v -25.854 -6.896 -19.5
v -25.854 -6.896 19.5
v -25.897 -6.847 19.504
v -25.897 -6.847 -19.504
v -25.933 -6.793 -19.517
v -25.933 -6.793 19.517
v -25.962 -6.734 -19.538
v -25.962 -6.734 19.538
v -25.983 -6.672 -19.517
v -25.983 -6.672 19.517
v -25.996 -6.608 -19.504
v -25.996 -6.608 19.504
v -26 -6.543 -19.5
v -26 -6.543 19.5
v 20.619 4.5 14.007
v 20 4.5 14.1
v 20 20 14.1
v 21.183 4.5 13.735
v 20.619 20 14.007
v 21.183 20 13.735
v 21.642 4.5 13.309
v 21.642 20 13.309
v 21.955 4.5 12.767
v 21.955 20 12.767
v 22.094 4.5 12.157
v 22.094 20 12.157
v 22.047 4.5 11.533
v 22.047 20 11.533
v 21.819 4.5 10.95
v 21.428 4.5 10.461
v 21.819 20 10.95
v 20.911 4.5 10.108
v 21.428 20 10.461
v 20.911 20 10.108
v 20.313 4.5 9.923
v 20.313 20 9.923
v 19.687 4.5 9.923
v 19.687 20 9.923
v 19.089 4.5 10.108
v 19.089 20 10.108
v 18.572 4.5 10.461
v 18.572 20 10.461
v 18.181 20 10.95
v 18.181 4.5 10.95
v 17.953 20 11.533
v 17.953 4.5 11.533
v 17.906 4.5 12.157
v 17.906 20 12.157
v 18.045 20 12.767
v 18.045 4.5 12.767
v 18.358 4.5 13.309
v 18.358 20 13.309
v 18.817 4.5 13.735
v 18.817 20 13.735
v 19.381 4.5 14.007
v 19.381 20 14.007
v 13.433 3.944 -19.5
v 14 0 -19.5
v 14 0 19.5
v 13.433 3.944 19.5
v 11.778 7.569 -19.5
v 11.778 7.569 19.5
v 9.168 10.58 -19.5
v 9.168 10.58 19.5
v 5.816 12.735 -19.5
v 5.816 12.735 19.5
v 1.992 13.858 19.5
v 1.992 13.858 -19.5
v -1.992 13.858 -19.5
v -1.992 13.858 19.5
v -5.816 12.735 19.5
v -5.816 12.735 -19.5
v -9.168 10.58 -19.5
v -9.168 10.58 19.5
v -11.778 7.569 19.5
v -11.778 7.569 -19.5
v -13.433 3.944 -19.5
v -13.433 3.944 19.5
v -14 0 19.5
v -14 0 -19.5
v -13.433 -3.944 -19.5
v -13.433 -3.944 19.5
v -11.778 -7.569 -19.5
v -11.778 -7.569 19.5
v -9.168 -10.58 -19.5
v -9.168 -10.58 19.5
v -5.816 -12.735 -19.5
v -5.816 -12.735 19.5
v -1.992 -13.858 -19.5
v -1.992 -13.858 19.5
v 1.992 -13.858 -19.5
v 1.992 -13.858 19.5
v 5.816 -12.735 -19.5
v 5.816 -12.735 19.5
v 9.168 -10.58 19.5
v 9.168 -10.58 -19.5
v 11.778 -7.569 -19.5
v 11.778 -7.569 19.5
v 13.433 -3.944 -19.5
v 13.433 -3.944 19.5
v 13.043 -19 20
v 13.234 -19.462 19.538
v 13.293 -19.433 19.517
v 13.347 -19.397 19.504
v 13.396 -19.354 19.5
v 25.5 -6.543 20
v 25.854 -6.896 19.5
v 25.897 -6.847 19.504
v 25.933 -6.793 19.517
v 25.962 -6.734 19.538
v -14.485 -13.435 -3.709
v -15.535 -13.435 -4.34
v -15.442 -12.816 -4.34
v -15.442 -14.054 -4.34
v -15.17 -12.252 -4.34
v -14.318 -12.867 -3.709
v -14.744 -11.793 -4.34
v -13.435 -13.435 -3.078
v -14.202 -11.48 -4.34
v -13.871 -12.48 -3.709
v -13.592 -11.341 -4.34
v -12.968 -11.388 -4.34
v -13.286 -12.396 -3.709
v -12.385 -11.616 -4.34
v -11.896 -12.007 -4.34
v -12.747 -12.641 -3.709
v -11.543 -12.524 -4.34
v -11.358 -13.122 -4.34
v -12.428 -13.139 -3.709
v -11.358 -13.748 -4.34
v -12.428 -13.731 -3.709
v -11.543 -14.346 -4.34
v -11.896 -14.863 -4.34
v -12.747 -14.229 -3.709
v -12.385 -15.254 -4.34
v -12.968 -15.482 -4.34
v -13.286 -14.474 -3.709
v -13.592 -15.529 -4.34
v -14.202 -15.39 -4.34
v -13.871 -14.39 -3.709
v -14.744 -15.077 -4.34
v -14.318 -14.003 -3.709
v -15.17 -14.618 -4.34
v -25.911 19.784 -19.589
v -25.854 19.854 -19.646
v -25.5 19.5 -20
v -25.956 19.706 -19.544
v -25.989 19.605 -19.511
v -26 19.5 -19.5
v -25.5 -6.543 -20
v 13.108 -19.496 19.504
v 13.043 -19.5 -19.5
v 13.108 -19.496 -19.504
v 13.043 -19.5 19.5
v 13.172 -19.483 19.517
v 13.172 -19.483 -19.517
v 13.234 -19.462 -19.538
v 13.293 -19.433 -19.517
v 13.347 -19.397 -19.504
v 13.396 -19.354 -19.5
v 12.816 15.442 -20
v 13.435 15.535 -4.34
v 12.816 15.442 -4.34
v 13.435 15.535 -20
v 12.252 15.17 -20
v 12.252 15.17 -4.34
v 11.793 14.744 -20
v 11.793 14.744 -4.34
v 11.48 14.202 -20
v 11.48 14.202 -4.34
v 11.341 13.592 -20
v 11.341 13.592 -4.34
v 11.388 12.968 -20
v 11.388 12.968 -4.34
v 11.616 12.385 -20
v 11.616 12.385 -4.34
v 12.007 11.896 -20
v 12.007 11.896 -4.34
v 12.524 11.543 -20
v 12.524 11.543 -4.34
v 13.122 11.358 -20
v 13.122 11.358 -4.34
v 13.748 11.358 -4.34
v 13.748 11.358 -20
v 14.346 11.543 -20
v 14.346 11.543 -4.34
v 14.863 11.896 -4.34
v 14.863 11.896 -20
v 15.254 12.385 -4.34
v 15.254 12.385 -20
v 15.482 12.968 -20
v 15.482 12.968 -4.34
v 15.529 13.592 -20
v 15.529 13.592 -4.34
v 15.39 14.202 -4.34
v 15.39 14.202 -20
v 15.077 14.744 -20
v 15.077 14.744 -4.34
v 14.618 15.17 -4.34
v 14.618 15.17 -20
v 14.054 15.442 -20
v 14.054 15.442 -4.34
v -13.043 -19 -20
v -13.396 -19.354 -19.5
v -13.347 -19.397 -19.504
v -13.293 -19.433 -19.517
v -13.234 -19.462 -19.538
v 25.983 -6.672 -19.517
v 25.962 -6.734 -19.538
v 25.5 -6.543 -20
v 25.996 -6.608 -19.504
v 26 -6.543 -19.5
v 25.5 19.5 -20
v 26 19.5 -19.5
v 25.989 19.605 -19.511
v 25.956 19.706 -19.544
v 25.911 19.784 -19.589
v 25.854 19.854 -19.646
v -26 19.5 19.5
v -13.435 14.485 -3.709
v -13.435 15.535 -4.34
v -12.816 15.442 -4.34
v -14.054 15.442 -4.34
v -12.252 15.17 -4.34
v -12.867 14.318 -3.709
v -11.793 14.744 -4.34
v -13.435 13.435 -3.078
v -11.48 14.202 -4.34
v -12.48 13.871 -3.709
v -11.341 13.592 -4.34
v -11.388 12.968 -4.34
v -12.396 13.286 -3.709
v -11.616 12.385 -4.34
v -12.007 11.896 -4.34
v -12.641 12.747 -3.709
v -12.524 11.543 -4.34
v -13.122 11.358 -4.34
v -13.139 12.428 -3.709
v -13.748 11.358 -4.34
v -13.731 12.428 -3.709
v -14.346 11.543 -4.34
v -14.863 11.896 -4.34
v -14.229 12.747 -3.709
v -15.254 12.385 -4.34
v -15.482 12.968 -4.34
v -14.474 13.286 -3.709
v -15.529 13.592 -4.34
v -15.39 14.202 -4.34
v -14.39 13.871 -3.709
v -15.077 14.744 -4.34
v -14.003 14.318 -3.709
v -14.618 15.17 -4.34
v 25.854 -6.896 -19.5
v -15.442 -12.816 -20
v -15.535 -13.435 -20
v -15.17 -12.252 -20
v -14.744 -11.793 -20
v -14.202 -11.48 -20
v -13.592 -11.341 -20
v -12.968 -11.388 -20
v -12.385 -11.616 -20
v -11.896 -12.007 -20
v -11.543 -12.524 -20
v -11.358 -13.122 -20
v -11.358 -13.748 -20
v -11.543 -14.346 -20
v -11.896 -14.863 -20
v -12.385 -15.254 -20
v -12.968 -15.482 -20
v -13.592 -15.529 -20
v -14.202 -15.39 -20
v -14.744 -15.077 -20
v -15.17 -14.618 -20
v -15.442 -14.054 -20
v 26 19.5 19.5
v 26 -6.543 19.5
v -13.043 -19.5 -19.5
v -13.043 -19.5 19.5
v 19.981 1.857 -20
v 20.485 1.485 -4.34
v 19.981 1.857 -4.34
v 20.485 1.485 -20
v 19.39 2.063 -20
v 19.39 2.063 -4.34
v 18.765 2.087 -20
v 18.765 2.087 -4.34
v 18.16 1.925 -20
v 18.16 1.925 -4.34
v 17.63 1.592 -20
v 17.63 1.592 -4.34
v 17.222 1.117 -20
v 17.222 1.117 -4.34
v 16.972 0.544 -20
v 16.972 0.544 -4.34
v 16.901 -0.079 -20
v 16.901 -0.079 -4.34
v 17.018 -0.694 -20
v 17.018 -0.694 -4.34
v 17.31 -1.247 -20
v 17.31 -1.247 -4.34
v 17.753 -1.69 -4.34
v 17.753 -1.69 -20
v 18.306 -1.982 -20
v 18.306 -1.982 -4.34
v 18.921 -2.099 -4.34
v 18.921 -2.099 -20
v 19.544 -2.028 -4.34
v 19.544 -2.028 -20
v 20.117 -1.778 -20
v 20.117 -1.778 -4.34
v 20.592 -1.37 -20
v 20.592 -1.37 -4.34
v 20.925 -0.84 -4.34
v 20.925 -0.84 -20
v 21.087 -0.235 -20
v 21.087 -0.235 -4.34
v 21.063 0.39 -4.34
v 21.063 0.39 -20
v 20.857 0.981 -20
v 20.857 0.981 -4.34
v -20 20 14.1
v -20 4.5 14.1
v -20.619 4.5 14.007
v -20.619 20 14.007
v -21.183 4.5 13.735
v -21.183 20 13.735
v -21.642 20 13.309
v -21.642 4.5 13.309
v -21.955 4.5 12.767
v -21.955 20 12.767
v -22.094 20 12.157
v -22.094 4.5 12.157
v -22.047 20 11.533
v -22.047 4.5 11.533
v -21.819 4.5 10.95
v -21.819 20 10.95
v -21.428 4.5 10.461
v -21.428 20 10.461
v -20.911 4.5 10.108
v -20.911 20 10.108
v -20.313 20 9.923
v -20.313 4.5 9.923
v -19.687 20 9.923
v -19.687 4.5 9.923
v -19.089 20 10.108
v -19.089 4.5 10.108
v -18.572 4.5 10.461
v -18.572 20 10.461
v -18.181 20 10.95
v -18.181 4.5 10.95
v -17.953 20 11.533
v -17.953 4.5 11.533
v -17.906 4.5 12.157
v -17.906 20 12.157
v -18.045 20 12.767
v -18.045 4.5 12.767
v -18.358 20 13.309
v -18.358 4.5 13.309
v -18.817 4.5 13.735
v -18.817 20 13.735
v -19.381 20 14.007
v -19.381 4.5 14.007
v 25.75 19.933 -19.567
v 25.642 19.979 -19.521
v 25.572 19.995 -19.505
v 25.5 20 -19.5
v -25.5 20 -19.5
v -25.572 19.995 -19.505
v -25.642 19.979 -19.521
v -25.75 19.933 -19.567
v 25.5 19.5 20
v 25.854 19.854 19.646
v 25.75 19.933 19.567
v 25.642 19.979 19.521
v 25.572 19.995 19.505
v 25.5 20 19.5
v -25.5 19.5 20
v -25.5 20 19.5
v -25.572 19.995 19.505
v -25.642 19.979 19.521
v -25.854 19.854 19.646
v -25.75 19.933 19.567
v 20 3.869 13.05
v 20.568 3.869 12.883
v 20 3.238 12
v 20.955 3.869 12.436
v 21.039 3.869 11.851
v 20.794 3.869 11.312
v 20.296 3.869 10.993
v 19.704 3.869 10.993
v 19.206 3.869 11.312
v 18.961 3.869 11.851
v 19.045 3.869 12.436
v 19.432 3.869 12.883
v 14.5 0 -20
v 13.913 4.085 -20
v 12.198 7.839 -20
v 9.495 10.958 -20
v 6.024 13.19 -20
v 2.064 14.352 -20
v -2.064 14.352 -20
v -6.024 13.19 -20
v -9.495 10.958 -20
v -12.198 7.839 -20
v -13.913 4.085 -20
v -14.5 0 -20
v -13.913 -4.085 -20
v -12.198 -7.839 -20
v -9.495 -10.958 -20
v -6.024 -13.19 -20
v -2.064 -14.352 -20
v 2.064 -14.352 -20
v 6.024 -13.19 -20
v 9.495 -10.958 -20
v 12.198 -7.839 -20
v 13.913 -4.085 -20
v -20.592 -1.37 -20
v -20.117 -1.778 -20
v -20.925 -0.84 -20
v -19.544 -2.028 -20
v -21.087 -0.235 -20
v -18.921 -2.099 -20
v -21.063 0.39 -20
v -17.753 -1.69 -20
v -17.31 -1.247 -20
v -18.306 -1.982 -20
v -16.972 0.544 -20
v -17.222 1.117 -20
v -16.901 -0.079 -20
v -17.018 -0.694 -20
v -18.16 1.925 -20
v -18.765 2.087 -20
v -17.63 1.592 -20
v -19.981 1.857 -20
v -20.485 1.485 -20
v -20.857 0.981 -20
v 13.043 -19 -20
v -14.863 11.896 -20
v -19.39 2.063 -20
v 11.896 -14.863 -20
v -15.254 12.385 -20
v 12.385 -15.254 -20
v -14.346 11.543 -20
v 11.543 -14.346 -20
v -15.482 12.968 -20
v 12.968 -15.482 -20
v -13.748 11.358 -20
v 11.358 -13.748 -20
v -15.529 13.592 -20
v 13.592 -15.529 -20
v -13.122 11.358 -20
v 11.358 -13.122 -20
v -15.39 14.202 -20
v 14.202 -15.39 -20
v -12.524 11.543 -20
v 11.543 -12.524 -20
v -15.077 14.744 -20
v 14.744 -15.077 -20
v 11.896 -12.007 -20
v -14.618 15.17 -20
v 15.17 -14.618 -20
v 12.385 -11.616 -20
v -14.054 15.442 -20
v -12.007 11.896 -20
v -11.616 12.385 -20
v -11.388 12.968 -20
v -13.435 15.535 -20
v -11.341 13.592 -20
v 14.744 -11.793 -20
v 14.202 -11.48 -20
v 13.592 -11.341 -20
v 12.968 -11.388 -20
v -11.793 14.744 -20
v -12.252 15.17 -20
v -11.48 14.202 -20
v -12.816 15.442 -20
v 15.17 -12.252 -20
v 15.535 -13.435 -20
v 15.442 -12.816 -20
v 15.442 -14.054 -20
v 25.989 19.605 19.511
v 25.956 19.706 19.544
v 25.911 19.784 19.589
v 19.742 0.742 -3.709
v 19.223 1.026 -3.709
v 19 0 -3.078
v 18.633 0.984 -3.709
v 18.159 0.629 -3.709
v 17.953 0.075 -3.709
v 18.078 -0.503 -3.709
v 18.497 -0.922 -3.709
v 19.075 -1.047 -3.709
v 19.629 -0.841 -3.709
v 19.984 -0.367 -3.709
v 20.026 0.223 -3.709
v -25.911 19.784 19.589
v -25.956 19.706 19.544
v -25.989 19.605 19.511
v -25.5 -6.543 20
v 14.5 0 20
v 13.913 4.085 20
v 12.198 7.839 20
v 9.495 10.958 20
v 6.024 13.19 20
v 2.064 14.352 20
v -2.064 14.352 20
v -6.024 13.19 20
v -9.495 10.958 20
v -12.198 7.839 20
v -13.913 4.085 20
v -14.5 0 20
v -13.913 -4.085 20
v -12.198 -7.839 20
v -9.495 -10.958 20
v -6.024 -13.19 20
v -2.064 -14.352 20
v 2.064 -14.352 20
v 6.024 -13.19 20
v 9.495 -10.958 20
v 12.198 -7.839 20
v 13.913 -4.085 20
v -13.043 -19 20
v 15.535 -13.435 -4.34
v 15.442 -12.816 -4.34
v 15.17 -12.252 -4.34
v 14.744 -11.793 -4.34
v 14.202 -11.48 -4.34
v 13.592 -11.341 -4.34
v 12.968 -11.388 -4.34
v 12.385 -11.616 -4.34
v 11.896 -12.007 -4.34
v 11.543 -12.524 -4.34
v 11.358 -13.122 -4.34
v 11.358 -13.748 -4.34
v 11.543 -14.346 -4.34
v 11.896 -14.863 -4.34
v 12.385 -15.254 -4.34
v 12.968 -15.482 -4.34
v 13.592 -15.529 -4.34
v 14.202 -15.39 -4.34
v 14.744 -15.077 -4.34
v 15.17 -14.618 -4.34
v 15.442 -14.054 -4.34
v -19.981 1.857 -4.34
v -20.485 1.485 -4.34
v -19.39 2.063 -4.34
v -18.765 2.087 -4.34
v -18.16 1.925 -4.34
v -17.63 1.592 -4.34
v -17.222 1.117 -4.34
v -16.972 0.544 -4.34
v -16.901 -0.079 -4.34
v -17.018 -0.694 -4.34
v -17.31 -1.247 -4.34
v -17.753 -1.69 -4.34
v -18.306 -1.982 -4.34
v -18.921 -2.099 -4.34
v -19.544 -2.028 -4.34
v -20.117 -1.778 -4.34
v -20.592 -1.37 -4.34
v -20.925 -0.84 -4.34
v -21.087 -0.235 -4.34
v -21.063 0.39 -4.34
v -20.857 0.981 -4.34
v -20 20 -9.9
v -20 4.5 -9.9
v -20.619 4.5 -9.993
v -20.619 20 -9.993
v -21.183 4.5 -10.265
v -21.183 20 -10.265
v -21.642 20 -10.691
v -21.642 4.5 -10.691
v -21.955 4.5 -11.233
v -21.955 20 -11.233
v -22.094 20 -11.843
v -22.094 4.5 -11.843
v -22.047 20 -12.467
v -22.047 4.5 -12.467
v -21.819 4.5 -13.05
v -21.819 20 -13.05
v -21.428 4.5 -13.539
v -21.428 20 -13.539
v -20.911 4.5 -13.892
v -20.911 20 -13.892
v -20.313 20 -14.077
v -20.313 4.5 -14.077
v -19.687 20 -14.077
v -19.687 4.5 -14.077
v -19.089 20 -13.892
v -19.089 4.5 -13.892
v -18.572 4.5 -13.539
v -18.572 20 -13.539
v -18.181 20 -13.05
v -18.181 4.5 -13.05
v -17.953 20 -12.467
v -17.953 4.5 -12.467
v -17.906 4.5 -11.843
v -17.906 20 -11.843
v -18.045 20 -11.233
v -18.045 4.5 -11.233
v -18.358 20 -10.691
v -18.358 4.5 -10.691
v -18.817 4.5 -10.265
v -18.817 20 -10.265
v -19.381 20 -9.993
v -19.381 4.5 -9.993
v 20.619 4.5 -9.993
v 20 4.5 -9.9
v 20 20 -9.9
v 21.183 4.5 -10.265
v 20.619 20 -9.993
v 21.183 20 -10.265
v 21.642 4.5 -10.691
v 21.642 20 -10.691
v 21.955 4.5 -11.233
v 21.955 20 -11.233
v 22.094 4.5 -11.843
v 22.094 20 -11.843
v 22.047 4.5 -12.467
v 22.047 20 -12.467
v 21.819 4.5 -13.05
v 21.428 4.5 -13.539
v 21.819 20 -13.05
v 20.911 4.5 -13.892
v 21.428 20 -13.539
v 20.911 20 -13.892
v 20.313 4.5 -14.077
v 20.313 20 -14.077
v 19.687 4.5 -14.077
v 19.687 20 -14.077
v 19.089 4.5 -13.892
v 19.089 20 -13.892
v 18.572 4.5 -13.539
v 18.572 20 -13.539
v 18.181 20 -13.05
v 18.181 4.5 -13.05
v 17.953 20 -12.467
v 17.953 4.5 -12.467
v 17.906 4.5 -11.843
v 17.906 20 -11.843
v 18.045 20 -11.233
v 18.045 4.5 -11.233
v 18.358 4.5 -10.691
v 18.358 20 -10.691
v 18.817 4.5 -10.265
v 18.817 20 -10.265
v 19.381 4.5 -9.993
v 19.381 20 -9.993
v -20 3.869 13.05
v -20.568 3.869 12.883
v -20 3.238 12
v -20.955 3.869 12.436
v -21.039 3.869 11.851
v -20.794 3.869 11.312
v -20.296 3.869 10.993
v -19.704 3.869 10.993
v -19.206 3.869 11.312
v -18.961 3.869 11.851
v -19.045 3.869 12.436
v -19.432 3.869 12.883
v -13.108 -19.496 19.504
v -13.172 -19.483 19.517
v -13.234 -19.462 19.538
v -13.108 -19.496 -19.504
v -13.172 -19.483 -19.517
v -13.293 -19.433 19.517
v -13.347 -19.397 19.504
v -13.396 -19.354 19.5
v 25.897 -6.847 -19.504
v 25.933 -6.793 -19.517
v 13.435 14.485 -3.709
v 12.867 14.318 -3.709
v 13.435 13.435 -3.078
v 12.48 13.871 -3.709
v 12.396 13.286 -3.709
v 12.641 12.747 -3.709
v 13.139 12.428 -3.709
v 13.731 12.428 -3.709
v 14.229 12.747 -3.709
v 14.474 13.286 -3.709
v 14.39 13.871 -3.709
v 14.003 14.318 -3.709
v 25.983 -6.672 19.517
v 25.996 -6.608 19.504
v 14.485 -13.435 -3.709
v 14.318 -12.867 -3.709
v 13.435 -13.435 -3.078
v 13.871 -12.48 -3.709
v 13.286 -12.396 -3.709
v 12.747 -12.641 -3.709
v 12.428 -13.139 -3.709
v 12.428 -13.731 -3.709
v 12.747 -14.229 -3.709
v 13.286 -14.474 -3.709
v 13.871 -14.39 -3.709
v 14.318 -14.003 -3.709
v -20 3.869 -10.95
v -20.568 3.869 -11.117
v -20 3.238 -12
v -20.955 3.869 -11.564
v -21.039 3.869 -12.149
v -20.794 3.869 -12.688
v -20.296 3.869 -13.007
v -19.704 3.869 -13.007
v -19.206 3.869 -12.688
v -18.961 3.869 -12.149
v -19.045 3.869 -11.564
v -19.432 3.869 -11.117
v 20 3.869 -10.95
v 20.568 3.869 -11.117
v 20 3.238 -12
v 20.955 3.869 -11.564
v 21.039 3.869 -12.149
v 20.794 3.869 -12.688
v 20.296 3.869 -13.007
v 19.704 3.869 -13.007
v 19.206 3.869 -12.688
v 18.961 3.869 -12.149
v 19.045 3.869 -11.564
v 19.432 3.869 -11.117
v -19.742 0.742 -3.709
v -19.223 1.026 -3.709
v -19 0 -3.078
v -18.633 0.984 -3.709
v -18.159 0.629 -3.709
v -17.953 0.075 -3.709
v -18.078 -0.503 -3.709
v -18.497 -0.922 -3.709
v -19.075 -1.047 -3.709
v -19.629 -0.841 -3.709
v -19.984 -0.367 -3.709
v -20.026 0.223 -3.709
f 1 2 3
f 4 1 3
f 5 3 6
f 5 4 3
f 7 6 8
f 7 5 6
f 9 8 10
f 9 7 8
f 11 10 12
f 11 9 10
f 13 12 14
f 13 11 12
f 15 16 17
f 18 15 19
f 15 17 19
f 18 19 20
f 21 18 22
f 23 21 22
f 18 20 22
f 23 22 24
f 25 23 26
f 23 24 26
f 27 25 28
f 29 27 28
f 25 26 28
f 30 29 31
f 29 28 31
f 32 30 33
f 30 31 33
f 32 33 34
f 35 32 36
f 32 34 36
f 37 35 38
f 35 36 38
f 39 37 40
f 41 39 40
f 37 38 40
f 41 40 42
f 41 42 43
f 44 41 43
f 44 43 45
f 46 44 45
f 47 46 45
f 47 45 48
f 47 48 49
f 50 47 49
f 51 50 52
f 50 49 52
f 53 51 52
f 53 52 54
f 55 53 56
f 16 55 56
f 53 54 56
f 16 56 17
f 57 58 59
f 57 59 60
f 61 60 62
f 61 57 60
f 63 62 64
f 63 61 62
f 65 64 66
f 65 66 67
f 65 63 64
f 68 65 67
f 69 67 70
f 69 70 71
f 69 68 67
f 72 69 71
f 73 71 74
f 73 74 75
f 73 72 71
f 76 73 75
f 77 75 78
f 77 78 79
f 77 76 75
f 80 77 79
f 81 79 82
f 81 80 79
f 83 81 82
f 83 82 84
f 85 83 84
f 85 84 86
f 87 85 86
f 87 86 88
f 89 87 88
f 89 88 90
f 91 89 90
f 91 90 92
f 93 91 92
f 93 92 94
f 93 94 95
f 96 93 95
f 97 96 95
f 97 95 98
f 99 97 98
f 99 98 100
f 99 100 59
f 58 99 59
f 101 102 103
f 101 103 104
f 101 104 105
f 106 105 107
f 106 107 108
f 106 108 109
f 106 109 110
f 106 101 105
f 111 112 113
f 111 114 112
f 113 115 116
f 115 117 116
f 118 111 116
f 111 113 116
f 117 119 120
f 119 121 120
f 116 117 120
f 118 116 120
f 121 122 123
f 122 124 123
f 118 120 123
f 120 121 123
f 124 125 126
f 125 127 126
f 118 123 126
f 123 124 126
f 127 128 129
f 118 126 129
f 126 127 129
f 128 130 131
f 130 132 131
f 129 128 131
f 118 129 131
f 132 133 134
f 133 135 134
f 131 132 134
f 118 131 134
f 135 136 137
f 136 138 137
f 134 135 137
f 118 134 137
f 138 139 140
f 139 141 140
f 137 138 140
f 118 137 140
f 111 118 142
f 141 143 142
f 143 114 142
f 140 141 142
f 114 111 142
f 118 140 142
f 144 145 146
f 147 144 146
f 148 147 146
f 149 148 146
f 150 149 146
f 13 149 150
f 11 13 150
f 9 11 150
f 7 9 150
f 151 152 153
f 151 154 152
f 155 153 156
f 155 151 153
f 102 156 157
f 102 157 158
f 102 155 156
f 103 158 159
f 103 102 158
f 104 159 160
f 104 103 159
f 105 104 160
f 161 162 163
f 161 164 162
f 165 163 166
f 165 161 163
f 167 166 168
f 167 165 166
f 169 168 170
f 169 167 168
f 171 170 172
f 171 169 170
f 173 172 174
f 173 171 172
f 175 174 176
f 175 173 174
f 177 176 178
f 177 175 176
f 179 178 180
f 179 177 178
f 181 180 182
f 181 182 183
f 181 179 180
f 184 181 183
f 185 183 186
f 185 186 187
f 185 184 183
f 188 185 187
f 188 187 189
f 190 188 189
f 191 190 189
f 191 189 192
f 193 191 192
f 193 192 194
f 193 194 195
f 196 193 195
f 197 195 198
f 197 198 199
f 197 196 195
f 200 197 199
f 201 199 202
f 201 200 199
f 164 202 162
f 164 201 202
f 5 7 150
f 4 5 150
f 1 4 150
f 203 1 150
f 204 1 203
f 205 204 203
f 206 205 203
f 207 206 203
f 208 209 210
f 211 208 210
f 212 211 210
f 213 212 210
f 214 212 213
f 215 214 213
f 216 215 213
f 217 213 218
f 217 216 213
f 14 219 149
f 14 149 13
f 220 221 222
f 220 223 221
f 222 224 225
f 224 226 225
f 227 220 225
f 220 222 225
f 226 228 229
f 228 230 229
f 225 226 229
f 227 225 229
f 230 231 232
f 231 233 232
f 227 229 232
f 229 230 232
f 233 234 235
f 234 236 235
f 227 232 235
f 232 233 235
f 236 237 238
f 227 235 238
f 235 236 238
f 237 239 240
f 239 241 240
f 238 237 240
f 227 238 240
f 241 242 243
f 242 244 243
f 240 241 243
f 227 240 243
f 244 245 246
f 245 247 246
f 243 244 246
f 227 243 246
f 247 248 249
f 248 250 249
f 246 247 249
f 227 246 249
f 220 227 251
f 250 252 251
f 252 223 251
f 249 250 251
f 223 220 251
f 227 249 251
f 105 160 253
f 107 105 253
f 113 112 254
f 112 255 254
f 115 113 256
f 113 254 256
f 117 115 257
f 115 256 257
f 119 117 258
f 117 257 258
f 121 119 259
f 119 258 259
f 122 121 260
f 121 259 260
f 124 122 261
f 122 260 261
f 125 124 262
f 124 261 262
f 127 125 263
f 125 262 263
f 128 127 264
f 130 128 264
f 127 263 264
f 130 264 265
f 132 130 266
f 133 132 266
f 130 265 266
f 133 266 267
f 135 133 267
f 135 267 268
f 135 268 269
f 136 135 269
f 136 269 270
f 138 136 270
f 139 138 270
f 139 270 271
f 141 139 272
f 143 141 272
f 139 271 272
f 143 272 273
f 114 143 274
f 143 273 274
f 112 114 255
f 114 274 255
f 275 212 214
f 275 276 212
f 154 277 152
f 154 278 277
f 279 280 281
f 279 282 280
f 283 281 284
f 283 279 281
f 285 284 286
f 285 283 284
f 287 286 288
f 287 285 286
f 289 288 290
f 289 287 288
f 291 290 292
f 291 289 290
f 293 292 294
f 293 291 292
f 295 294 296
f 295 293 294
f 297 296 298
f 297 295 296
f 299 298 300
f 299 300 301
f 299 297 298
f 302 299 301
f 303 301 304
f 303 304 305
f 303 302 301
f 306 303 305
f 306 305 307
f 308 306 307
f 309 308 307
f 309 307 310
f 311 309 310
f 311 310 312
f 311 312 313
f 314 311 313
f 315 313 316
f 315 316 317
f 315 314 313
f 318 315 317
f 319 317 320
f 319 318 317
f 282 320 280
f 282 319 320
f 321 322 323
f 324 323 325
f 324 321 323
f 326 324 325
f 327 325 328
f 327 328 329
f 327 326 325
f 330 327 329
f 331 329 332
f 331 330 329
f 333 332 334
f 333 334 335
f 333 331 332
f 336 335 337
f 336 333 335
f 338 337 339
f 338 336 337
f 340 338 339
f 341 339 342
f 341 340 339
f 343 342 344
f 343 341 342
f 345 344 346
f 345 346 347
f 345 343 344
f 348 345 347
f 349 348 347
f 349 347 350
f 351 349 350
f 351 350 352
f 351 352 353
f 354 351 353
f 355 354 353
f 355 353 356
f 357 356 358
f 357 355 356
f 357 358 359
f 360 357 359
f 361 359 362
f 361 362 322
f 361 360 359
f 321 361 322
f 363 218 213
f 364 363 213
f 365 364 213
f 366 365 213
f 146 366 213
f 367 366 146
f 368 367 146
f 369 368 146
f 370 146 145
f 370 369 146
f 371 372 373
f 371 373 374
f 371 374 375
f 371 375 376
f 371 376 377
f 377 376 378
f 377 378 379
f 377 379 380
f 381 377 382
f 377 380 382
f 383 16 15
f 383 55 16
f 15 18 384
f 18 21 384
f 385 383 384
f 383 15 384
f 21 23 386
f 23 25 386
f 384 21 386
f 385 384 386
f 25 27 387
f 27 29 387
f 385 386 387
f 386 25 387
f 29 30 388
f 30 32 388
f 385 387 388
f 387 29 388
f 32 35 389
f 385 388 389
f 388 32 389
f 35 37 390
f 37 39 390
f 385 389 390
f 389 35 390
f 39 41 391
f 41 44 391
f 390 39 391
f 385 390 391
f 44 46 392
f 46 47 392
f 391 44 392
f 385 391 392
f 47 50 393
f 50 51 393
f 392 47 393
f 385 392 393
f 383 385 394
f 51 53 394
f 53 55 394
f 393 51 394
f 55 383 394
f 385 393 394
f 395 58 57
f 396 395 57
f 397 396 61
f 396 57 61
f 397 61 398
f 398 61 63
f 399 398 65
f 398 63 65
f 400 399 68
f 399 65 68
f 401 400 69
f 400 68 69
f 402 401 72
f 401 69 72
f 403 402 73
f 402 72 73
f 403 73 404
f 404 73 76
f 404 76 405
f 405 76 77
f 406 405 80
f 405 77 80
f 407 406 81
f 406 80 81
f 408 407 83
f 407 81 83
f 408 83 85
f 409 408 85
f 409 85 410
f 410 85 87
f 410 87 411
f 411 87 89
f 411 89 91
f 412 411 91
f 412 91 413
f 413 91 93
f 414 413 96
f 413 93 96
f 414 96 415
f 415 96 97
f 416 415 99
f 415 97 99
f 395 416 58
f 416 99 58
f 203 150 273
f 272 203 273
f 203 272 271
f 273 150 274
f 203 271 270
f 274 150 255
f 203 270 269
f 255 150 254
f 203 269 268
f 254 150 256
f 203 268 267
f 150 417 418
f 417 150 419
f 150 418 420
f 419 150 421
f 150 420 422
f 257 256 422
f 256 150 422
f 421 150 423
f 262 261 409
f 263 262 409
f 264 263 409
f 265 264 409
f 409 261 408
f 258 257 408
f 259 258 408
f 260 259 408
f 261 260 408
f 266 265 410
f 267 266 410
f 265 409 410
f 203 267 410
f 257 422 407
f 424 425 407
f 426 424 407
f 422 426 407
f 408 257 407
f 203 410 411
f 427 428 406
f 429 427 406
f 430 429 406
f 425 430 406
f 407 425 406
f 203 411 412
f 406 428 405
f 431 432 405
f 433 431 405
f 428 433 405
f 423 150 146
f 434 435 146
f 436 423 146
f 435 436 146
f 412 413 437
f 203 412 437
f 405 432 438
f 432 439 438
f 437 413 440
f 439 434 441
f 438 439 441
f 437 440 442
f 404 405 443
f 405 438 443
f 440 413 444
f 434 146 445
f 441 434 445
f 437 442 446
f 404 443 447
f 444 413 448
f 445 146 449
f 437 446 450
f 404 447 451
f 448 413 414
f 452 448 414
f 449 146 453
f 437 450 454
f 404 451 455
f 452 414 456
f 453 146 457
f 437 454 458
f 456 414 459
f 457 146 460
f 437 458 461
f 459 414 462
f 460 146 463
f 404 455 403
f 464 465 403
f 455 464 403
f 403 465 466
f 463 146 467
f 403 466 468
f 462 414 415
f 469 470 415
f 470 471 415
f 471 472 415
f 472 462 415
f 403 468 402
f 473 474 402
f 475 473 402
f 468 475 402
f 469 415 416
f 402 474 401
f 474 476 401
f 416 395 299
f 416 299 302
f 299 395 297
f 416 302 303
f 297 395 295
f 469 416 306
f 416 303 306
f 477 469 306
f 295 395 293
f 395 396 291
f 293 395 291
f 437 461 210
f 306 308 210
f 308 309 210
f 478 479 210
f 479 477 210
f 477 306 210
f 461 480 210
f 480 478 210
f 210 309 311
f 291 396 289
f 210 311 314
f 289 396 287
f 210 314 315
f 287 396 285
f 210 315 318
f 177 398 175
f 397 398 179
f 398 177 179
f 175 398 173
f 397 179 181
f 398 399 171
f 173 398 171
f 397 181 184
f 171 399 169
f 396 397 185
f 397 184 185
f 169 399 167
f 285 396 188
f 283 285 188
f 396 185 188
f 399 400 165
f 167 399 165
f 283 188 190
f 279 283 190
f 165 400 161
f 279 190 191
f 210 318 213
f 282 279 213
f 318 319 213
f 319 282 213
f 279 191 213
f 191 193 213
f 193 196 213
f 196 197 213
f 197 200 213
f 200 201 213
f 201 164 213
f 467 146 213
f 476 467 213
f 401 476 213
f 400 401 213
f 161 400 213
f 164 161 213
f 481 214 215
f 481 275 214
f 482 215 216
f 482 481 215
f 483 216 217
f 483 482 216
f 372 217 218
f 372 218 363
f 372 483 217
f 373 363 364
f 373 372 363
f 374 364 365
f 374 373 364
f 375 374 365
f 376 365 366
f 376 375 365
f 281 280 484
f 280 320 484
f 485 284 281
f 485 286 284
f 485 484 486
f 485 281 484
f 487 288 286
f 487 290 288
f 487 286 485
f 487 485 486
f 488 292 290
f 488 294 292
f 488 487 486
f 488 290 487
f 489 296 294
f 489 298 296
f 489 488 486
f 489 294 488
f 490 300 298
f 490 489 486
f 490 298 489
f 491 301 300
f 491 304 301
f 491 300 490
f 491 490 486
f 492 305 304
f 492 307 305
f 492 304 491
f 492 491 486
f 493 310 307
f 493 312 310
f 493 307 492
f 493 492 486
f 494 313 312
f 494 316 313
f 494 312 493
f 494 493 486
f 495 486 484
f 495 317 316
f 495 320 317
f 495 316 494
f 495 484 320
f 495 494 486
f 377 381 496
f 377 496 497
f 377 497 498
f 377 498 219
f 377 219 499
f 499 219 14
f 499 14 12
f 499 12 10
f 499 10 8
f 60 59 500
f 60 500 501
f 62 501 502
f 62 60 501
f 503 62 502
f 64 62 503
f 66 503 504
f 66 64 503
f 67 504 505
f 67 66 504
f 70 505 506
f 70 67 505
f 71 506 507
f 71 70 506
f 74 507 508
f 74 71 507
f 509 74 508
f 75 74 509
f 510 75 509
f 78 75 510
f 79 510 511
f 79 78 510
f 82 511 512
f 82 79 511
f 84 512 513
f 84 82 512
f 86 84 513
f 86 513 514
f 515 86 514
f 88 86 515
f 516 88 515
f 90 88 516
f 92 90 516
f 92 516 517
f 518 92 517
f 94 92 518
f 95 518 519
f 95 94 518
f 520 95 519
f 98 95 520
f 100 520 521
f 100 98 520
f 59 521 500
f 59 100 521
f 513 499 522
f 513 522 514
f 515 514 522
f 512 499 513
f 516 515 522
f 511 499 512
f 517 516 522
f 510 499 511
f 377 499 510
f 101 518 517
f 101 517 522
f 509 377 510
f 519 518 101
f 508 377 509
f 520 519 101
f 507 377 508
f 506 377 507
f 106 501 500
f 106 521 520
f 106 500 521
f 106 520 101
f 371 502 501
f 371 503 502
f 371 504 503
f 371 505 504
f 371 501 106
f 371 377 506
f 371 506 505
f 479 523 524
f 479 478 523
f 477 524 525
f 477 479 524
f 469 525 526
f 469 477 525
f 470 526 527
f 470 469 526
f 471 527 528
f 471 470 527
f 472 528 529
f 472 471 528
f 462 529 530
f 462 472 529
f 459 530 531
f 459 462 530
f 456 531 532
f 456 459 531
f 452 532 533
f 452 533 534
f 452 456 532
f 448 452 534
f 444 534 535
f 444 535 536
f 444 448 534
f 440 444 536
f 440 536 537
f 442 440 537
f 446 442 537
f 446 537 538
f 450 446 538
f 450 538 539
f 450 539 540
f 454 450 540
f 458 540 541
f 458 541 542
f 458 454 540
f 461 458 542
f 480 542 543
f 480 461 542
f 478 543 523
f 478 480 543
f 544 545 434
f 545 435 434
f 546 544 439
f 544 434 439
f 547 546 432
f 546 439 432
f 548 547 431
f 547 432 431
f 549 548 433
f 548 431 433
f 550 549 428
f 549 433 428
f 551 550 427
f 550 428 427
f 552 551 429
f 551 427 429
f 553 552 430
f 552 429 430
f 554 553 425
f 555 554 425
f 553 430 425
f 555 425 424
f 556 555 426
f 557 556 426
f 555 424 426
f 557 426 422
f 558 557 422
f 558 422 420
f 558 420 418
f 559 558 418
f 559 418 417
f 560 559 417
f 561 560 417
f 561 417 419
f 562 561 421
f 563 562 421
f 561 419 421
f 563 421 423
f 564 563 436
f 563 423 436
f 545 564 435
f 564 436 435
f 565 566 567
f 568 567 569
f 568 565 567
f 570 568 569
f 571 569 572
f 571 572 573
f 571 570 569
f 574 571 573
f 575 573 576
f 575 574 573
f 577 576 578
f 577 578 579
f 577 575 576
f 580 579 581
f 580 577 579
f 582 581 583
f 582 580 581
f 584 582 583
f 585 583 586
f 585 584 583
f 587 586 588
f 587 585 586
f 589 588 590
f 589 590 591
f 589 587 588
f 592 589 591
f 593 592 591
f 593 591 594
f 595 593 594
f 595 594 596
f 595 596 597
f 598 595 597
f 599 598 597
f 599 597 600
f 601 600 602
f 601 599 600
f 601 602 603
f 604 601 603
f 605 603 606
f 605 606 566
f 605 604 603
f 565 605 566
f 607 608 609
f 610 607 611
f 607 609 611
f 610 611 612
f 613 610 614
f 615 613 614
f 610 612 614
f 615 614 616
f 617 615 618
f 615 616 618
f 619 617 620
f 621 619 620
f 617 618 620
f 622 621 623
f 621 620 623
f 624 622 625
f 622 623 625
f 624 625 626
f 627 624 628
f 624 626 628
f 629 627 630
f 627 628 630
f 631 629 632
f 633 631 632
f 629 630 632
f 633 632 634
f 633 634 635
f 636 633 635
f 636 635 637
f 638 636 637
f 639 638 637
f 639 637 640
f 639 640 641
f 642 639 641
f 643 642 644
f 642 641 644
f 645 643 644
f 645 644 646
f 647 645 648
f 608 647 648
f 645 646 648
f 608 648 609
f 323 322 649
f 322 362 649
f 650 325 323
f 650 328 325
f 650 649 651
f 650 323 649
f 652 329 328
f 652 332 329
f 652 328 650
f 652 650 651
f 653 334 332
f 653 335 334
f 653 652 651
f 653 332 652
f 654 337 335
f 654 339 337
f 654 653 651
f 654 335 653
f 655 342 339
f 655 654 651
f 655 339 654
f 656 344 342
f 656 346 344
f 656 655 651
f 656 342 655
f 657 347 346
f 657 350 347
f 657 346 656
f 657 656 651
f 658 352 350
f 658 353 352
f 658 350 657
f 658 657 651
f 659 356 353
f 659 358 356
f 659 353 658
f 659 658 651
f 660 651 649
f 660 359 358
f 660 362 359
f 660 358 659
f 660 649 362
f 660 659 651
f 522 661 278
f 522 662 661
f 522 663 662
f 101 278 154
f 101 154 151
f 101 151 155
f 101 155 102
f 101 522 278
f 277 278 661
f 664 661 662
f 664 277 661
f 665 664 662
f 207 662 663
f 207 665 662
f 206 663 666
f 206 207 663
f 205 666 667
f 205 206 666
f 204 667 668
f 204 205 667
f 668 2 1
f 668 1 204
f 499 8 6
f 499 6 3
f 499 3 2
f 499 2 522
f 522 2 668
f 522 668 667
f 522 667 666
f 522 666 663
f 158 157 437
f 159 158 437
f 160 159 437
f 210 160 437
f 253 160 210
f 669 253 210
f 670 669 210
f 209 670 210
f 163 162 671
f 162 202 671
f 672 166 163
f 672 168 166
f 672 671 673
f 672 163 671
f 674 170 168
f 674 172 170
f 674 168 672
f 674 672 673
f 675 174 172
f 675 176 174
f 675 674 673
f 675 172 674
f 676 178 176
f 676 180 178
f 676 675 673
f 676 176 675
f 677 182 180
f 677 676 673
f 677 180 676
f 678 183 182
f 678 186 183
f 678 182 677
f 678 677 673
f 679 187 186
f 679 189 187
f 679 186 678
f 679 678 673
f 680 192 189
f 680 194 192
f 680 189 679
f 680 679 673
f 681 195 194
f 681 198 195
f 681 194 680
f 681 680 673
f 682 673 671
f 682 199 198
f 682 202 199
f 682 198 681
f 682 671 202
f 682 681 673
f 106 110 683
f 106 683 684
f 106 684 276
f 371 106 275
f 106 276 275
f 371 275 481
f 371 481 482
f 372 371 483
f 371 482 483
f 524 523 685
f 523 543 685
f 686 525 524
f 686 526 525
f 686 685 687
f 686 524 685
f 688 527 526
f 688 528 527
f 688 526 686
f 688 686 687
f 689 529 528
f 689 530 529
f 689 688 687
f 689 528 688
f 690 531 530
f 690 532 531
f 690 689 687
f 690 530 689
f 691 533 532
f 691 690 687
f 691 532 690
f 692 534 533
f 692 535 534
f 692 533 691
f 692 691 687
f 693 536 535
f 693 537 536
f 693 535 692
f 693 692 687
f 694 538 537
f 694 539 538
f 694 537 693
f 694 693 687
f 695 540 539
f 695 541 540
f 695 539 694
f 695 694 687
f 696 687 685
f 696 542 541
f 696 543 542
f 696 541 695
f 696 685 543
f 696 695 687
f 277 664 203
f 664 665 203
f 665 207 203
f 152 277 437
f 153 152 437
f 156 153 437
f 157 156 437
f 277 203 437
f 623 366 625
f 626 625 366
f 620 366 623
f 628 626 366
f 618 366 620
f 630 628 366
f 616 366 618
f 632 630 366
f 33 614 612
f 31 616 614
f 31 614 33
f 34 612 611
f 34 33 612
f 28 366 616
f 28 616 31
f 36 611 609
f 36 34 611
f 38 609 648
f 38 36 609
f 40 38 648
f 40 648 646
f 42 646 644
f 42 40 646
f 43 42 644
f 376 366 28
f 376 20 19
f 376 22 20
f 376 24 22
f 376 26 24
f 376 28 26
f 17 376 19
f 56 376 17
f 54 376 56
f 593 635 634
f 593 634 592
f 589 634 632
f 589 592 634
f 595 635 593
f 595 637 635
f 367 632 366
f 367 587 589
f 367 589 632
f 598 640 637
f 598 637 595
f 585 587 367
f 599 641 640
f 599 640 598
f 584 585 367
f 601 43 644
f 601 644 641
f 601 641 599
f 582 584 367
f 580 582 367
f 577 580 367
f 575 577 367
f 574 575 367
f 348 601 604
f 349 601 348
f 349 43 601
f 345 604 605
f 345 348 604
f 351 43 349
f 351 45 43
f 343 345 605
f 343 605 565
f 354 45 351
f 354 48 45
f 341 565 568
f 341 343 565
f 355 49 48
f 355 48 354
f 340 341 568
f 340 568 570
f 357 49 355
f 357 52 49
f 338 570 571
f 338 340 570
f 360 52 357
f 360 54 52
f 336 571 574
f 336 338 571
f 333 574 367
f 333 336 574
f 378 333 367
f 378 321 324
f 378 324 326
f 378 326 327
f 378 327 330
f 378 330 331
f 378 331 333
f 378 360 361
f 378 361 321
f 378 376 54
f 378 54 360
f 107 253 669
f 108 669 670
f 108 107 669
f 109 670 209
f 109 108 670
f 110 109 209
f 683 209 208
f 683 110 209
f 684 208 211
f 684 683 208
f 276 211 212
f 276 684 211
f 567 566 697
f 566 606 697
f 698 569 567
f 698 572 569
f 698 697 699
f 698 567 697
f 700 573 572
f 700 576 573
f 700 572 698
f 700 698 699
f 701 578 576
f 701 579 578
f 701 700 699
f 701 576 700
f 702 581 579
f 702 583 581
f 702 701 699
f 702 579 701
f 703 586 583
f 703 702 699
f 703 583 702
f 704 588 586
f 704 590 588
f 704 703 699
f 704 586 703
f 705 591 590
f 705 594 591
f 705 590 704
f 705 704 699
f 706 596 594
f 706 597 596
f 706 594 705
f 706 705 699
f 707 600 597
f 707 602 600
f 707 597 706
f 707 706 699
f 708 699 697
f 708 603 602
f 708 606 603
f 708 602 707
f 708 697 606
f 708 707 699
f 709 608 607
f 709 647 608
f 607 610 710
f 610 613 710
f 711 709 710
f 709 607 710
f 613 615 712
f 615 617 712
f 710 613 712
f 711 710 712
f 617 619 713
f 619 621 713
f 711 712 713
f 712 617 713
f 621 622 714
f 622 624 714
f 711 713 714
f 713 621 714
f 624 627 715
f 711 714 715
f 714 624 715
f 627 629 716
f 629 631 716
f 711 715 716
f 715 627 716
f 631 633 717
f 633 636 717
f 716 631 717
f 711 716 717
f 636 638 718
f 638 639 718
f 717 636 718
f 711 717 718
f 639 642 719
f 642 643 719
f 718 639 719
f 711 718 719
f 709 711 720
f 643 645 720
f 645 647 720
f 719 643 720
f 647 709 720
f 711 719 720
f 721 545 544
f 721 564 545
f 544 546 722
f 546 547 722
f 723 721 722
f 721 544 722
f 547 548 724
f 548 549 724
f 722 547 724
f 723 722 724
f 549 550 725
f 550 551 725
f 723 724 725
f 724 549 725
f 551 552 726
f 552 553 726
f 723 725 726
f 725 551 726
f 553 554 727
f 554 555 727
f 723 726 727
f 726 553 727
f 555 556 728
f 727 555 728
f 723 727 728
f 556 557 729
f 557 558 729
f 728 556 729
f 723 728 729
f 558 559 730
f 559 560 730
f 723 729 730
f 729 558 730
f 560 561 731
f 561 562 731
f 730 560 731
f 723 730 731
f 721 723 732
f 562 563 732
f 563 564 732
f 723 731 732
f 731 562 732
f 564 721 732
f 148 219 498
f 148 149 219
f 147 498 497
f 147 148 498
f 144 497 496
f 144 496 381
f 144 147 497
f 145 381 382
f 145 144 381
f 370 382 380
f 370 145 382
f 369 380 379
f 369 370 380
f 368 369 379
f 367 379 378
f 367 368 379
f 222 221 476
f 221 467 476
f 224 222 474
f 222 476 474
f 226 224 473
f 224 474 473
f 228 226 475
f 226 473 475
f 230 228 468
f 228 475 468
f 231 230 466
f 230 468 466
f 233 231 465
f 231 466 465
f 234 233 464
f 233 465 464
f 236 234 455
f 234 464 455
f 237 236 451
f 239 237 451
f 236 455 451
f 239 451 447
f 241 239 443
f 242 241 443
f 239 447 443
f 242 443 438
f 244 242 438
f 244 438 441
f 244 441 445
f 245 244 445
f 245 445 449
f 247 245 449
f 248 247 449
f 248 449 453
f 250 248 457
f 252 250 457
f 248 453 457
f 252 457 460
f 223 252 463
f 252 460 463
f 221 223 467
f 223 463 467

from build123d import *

# Parameters (mm, degrees)
SKETCH1_R                      = 14
BOSS_EXTRUDE1_DEPTH            = 20
CIRPATTERN1_COUNT              = 3
CIRPATTERN1_ANGLE              = 90
M5X0_8_TAPPED_HOLE2_AT_2_COUNT = 2
M5X0_8_TAPPED_HOLE2_AT_2_PITCH = 24
CHAMFER1_SIZE                  = 0.5
FILLET1_R                      = 0.5


with BuildPart() as part:
    # Sketch1 → Boss-Extrude1 (new body, symmetric)
    with BuildSketch(Plane.XY):
        Polygon((-13.25, -19.5), (13.25, -19.5), (26, -6.75), (26, 20), (-26, 20), (-26, -6.75), align=None)
        Circle(SKETCH1_R, mode=Mode.SUBTRACT)
    extrude(amount=BOSS_EXTRUDE1_DEPTH, both=True)

    # Sketch4 → M5x0.8 Tapped Hole1 (revolve, cut)
    with BuildSketch(Plane(origin=(13.435028843, 13.435028843, -20), x_dir=(0, 1, 0), z_dir=(1, 0, 0))):
        Polygon((0, 0), (0, 16.9218073), (2.1, 15.66), (2.1, 0), align=None)
    m5x0_8_tapped_hole1 = revolve(axis=Axis((13.435028843, 13.435028843, -26.35), (0, 0, 1)), mode=Mode.SUBTRACT)

    # CirPattern1: M5x0.8 Tapped Hole1 ×3 about axis
    cirpattern1_axis = Axis((0, 0, 0), (0, 0, -1))
    for i in range(1, CIRPATTERN1_COUNT):
        add(m5x0_8_tapped_hole1.rotate(cirpattern1_axis, i * CIRPATTERN1_ANGLE / (CIRPATTERN1_COUNT - 1)), mode=Mode.SUBTRACT)

    # Mirror1: M5x0.8 Tapped Hole1 across plane
    add(m5x0_8_tapped_hole1.mirror(Plane(origin=(0, 0, 0), x_dir=(0, 0, 1), z_dir=(1, 0, 0))), mode=Mode.SUBTRACT)

    # Mirror1 copy 1 sketch → Mirror1 copy 1 (revolve, cut)
    with BuildSketch(Plane(origin=(-19, 0, -20), x_dir=(-0.707106781, 0.707106781, 0), z_dir=(-0.707106781, -0.707106781, 0))):
        Polygon((0, 0), (0, -16.9218073), (2.1, -15.66), (2.1, 0), align=None)
    revolve(axis=Axis((-19, 0, -26.35), (0, 0, -1)), mode=Mode.SUBTRACT)

    # Mirror1 copy 2 sketch → Mirror1 copy 2 (revolve, cut)
    with BuildSketch(Plane(origin=(-13.435028843, -13.435028843, -20), x_dir=(-1, 0, 0), z_dir=(0, -1, 0))):
        Polygon((0, 0), (0, -16.9218073), (2.1, -15.66), (2.1, 0), align=None)
    revolve(axis=Axis((-13.435028843, -13.435028843, -26.35), (0, 0, -1)), mode=Mode.SUBTRACT)

    # Sketch6 → M5x0.8 Tapped Hole2 (revolve, cut)
    with BuildSketch(Plane(origin=(-20, 20, -12), x_dir=(0, 0, 1), z_dir=(1, 0, 0))):
        Polygon((0, 0), (0, 16.7618073), (2.1, 15.5), (2.1, 0), align=None)
    m5x0_8_tapped_hole2 = revolve(axis=Axis((-20, 26.35, -12), (0, -1, 0)), mode=Mode.SUBTRACT)

    # M5x0.8 Tapped Hole2 at 2: M5x0.8 Tapped Hole2 ×2
    with Locations(*[(0, 0, i * M5X0_8_TAPPED_HOLE2_AT_2_PITCH) for i in range(1, M5X0_8_TAPPED_HOLE2_AT_2_COUNT)]):
        add(m5x0_8_tapped_hole2, mode=Mode.SUBTRACT)

    # Mirror2: M5x0.8 Tapped Hole2 across plane
    add(m5x0_8_tapped_hole2.mirror(Plane(origin=(0, 0, 0), x_dir=(0, 0, 1), z_dir=(1, 0, 0))), mode=Mode.SUBTRACT)

    # Mirror2 copy 1 sketch → Mirror2 copy 1 (revolve, cut)
    with BuildSketch(Plane(origin=(20, 20, 12), x_dir=(0, 0, 1), z_dir=(-1, 0, 0))):
        Polygon((0, 0), (0, -16.7618073), (2.1, -15.5), (2.1, 0), align=None)
    revolve(axis=Axis((20, 26.35, 12), (0, 1, 0)), mode=Mode.SUBTRACT)

    # Chamfer1
    chamfer1_edges = [part.edges().sort_by_distance(p)[0] for p in [
        (0, 20, 20),
        (-26, 6.625, 20),
        (-14, 0, -20),
        (-14, 0, 20),
        (-19.625, -13.125, 20),
        (0, -19.5, 20),
        (19.625, -13.125, 20),
        (0, -19.5, -20),
        (-19.625, -13.125, -20),
        (-26, 6.625, -20),
        (0, 20, -20),
        (26, 6.625, -20),
        (19.625, -13.125, -20),
        (26, 6.625, 20),
    ]]
    chamfer(chamfer1_edges, length=CHAMFER1_SIZE)

    # Fillet1
    fillet1_edges = [part.edges().sort_by_distance(p)[0] for p in [
        (26, 20, 0),
        (26, -6.75, 0),
        (13.25, -19.5, 0),
        (-13.25, -19.5, 0),
        (-26, -6.75, 0),
        (-26, 20, 0),
    ]]
    fillet(fillet1_edges, radius=FILLET1_R)


solid = part.part
